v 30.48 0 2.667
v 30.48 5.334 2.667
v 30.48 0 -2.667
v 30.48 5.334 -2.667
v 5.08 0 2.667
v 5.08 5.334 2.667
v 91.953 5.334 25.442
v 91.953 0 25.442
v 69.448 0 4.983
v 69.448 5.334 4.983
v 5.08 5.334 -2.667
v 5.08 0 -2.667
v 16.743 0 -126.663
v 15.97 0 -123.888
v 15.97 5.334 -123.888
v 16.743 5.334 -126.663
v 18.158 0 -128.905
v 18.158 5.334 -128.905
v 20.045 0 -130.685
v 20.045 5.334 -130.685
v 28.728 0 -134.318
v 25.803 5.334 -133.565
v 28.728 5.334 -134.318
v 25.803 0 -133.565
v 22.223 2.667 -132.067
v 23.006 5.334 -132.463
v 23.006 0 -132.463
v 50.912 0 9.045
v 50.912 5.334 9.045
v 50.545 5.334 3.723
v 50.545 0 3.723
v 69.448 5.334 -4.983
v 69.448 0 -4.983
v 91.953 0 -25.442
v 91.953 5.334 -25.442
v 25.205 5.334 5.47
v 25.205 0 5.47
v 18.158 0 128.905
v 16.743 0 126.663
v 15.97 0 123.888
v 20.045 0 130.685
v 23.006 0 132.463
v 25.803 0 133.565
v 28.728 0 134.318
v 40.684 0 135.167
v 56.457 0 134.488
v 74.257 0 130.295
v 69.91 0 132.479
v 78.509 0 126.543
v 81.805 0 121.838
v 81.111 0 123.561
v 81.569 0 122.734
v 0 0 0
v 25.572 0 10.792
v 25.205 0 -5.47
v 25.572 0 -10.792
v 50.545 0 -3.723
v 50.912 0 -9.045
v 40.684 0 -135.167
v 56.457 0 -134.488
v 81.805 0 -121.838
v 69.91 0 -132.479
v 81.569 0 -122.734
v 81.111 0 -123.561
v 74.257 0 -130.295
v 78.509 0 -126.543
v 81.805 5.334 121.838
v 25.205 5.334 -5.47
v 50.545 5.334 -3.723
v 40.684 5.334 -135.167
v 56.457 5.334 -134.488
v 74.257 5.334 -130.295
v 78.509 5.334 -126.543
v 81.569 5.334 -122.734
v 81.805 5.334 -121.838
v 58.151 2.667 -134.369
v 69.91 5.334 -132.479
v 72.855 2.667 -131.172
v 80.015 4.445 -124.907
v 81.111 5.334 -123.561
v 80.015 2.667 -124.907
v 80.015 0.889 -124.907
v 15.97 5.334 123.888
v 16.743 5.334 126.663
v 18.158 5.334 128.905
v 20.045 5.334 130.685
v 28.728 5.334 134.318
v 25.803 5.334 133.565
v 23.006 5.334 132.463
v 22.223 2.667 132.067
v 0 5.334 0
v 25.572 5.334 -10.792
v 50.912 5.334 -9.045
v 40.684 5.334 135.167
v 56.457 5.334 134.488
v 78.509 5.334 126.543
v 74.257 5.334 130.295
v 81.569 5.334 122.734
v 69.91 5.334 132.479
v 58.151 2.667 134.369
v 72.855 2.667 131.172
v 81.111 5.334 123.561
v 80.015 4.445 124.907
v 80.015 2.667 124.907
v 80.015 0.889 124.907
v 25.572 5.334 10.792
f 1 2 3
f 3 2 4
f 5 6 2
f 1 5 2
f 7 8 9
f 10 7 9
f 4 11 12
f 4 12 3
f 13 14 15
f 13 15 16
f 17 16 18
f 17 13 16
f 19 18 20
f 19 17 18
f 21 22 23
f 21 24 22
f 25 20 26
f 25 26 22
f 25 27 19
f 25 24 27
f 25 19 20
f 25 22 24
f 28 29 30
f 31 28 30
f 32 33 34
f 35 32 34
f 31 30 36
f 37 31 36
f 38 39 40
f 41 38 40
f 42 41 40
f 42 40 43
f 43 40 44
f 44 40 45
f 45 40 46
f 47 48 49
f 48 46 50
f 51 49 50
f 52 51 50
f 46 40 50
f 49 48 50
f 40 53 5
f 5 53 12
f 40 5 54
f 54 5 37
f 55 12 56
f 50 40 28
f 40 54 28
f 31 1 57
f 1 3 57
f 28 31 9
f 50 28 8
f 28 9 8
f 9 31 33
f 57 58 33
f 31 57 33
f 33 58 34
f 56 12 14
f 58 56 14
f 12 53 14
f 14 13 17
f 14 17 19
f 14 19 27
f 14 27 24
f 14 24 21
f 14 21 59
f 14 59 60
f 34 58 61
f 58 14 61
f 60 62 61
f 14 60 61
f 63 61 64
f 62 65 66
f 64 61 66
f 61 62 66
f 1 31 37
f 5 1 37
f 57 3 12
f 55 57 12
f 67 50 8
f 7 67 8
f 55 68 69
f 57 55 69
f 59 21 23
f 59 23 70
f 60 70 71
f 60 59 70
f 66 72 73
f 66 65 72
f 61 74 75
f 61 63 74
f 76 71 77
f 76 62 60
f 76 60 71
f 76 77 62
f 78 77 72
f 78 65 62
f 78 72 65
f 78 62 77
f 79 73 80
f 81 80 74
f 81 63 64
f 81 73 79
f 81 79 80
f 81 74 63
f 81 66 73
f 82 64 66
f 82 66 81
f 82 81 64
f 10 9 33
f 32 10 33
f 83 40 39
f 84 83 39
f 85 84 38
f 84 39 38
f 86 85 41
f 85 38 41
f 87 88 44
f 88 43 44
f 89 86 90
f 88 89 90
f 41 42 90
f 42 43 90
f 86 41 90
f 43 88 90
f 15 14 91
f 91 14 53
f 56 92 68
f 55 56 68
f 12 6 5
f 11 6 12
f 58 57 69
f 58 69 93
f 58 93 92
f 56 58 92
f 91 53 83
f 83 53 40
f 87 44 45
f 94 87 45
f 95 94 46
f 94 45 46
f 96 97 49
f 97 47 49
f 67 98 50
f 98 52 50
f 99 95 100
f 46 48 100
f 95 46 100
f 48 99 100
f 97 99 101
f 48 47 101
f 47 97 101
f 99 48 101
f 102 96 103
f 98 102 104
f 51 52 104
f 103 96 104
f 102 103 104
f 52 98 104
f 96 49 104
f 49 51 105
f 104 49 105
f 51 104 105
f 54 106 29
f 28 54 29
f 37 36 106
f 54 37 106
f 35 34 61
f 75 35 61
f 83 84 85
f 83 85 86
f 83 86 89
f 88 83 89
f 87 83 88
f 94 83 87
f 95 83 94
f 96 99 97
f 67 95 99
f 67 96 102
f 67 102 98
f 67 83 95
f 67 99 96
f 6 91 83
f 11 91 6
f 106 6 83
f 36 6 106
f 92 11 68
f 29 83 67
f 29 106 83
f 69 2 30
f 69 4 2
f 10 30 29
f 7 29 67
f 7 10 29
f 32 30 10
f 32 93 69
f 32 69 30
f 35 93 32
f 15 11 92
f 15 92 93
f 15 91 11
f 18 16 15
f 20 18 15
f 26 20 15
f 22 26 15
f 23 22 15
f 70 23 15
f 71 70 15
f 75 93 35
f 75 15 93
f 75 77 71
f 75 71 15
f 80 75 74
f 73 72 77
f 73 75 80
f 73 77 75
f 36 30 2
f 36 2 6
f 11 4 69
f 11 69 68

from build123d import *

# Parameters (mm, degrees)
BOSS_EXTRUDE1_DEPTH  = 5.334
FUSELAGE_SLOTS_REACH = 165.568
RUDDER_SLOT_REACH    = 165.568
SKETCH4_W            = 25.4
SKETCH4_H            = 5.334


with BuildPart() as part:
    # Sketch1 → Boss-Extrude1 (new body)
    with BuildSketch(Plane(origin=(0, 0, 0), x_dir=(1, 0, 0), z_dir=(0, 1, 0))):
        with BuildLine():
            Line((15.970216498, 123.888067637), (0, 0))
            Line((0, 0), (15.970216498, -123.888067637))
            add(Edge.make_bspline(
                [(15.970216498, -123.888067637), (16.496348793, -127.969509697), (23.126657383, -134.082989784), (33.998204042, -135.21680351), (46.054708275, -135.145094132), (57.878857589, -134.457454778), (71.986589127, -133.257487146), (78.619292876, -126.55856753), (81.681846945, -123.009151118), (81.805097467, -121.83833135)],
                knots=[0, 0, 0, 0, 0.137873605, 0.340707261, 0.419473129, 0.623495844, 0.825009795, 0.952423895, 1, 1, 1, 1], degree=3))
            Line((81.805097467, -121.83833135), (91.952571506, -25.442283053))
            Line((91.952571506, -25.442283053), (69.447862014, -4.983456242))
            Line((69.447862014, -4.983456242), (69.447862014, 4.983456242))
            Line((69.447862014, 4.983456242), (91.952571506, 25.442283053))
            Line((91.952571506, 25.442283053), (81.805097467, 121.83833135))
            add(Edge.make_bspline(
                [(81.805097467, 121.83833135), (81.681846945, 123.009151118), (78.619292876, 126.55856753), (71.986589127, 133.257487146), (57.878857589, 134.457454778), (46.054708275, 135.145094132), (33.998204042, 135.21680351), (23.126657383, 134.082989784), (16.496348793, 127.969509697), (15.970216498, 123.888067637)],
                knots=[0.230135461, 0.230135461, 0.230135461, 0.230135461, 0.277711566, 0.405125666, 0.606639617, 0.810662332, 0.8894282, 1.092261856, 1.230135461, 1.230135461, 1.230135461, 1.230135461], degree=3))
        make_face()
    extrude(amount=BOSS_EXTRUDE1_DEPTH)

    # Sketch3 → Fuselage Slots (cut, up to next)
    with BuildSketch(Plane(origin=(0, 5.334, 0), x_dir=(1, 0, 0), z_dir=(0, 1, 0)), mode=Mode.PRIVATE) as fuselage_slots_sk1:
        Polygon((50.911526431, 9.044666188), (25.571689625, 10.791855537), (25.204779861, 5.470489808), (50.544616668, 3.723300459), align=None)
    fuselage_slots_tool1 = extrude(fuselage_slots_sk1.sketch, amount=-FUSELAGE_SLOTS_REACH, mode=Mode.PRIVATE) & part.part
    # Sketch3 → Fuselage Slots (cut, up to next)
    with BuildSketch(Plane(origin=(0, 5.334, 0), x_dir=(1, 0, 0), z_dir=(0, 1, 0)), mode=Mode.PRIVATE) as fuselage_slots_sk2:
        Polygon((25.571689625, -10.791855537), (50.911526431, -9.044666188), (50.544616668, -3.723300459), (25.204779861, -5.470489808), align=None)
    fuselage_slots_tool2 = extrude(fuselage_slots_sk2.sketch, amount=-FUSELAGE_SLOTS_REACH, mode=Mode.PRIVATE) & part.part
    add(fuselage_slots_tool1.solids().sort_by_distance((38.058153, 5.334, -7.257578))[0], mode=Mode.SUBTRACT)
    add(fuselage_slots_tool2.solids().sort_by_distance((38.058153, 5.334, 7.257578))[0], mode=Mode.SUBTRACT)

    # Sketch4 → Rudder Slot (cut, up to next)
    with BuildSketch(Plane(origin=(0, 5.334, 0), x_dir=(1, 0, 0), z_dir=(0, 1, 0)), mode=Mode.PRIVATE) as rudder_slot_sk1:
        with Locations((17.78, 0)):
            Rectangle(SKETCH4_W, SKETCH4_H)
    rudder_slot_tool1 = extrude(rudder_slot_sk1.sketch, amount=-RUDDER_SLOT_REACH, mode=Mode.PRIVATE) & part.part
    add(rudder_slot_tool1.solids().sort_by_distance((17.78, 5.334, 0))[0], mode=Mode.SUBTRACT)


solid = part.part
